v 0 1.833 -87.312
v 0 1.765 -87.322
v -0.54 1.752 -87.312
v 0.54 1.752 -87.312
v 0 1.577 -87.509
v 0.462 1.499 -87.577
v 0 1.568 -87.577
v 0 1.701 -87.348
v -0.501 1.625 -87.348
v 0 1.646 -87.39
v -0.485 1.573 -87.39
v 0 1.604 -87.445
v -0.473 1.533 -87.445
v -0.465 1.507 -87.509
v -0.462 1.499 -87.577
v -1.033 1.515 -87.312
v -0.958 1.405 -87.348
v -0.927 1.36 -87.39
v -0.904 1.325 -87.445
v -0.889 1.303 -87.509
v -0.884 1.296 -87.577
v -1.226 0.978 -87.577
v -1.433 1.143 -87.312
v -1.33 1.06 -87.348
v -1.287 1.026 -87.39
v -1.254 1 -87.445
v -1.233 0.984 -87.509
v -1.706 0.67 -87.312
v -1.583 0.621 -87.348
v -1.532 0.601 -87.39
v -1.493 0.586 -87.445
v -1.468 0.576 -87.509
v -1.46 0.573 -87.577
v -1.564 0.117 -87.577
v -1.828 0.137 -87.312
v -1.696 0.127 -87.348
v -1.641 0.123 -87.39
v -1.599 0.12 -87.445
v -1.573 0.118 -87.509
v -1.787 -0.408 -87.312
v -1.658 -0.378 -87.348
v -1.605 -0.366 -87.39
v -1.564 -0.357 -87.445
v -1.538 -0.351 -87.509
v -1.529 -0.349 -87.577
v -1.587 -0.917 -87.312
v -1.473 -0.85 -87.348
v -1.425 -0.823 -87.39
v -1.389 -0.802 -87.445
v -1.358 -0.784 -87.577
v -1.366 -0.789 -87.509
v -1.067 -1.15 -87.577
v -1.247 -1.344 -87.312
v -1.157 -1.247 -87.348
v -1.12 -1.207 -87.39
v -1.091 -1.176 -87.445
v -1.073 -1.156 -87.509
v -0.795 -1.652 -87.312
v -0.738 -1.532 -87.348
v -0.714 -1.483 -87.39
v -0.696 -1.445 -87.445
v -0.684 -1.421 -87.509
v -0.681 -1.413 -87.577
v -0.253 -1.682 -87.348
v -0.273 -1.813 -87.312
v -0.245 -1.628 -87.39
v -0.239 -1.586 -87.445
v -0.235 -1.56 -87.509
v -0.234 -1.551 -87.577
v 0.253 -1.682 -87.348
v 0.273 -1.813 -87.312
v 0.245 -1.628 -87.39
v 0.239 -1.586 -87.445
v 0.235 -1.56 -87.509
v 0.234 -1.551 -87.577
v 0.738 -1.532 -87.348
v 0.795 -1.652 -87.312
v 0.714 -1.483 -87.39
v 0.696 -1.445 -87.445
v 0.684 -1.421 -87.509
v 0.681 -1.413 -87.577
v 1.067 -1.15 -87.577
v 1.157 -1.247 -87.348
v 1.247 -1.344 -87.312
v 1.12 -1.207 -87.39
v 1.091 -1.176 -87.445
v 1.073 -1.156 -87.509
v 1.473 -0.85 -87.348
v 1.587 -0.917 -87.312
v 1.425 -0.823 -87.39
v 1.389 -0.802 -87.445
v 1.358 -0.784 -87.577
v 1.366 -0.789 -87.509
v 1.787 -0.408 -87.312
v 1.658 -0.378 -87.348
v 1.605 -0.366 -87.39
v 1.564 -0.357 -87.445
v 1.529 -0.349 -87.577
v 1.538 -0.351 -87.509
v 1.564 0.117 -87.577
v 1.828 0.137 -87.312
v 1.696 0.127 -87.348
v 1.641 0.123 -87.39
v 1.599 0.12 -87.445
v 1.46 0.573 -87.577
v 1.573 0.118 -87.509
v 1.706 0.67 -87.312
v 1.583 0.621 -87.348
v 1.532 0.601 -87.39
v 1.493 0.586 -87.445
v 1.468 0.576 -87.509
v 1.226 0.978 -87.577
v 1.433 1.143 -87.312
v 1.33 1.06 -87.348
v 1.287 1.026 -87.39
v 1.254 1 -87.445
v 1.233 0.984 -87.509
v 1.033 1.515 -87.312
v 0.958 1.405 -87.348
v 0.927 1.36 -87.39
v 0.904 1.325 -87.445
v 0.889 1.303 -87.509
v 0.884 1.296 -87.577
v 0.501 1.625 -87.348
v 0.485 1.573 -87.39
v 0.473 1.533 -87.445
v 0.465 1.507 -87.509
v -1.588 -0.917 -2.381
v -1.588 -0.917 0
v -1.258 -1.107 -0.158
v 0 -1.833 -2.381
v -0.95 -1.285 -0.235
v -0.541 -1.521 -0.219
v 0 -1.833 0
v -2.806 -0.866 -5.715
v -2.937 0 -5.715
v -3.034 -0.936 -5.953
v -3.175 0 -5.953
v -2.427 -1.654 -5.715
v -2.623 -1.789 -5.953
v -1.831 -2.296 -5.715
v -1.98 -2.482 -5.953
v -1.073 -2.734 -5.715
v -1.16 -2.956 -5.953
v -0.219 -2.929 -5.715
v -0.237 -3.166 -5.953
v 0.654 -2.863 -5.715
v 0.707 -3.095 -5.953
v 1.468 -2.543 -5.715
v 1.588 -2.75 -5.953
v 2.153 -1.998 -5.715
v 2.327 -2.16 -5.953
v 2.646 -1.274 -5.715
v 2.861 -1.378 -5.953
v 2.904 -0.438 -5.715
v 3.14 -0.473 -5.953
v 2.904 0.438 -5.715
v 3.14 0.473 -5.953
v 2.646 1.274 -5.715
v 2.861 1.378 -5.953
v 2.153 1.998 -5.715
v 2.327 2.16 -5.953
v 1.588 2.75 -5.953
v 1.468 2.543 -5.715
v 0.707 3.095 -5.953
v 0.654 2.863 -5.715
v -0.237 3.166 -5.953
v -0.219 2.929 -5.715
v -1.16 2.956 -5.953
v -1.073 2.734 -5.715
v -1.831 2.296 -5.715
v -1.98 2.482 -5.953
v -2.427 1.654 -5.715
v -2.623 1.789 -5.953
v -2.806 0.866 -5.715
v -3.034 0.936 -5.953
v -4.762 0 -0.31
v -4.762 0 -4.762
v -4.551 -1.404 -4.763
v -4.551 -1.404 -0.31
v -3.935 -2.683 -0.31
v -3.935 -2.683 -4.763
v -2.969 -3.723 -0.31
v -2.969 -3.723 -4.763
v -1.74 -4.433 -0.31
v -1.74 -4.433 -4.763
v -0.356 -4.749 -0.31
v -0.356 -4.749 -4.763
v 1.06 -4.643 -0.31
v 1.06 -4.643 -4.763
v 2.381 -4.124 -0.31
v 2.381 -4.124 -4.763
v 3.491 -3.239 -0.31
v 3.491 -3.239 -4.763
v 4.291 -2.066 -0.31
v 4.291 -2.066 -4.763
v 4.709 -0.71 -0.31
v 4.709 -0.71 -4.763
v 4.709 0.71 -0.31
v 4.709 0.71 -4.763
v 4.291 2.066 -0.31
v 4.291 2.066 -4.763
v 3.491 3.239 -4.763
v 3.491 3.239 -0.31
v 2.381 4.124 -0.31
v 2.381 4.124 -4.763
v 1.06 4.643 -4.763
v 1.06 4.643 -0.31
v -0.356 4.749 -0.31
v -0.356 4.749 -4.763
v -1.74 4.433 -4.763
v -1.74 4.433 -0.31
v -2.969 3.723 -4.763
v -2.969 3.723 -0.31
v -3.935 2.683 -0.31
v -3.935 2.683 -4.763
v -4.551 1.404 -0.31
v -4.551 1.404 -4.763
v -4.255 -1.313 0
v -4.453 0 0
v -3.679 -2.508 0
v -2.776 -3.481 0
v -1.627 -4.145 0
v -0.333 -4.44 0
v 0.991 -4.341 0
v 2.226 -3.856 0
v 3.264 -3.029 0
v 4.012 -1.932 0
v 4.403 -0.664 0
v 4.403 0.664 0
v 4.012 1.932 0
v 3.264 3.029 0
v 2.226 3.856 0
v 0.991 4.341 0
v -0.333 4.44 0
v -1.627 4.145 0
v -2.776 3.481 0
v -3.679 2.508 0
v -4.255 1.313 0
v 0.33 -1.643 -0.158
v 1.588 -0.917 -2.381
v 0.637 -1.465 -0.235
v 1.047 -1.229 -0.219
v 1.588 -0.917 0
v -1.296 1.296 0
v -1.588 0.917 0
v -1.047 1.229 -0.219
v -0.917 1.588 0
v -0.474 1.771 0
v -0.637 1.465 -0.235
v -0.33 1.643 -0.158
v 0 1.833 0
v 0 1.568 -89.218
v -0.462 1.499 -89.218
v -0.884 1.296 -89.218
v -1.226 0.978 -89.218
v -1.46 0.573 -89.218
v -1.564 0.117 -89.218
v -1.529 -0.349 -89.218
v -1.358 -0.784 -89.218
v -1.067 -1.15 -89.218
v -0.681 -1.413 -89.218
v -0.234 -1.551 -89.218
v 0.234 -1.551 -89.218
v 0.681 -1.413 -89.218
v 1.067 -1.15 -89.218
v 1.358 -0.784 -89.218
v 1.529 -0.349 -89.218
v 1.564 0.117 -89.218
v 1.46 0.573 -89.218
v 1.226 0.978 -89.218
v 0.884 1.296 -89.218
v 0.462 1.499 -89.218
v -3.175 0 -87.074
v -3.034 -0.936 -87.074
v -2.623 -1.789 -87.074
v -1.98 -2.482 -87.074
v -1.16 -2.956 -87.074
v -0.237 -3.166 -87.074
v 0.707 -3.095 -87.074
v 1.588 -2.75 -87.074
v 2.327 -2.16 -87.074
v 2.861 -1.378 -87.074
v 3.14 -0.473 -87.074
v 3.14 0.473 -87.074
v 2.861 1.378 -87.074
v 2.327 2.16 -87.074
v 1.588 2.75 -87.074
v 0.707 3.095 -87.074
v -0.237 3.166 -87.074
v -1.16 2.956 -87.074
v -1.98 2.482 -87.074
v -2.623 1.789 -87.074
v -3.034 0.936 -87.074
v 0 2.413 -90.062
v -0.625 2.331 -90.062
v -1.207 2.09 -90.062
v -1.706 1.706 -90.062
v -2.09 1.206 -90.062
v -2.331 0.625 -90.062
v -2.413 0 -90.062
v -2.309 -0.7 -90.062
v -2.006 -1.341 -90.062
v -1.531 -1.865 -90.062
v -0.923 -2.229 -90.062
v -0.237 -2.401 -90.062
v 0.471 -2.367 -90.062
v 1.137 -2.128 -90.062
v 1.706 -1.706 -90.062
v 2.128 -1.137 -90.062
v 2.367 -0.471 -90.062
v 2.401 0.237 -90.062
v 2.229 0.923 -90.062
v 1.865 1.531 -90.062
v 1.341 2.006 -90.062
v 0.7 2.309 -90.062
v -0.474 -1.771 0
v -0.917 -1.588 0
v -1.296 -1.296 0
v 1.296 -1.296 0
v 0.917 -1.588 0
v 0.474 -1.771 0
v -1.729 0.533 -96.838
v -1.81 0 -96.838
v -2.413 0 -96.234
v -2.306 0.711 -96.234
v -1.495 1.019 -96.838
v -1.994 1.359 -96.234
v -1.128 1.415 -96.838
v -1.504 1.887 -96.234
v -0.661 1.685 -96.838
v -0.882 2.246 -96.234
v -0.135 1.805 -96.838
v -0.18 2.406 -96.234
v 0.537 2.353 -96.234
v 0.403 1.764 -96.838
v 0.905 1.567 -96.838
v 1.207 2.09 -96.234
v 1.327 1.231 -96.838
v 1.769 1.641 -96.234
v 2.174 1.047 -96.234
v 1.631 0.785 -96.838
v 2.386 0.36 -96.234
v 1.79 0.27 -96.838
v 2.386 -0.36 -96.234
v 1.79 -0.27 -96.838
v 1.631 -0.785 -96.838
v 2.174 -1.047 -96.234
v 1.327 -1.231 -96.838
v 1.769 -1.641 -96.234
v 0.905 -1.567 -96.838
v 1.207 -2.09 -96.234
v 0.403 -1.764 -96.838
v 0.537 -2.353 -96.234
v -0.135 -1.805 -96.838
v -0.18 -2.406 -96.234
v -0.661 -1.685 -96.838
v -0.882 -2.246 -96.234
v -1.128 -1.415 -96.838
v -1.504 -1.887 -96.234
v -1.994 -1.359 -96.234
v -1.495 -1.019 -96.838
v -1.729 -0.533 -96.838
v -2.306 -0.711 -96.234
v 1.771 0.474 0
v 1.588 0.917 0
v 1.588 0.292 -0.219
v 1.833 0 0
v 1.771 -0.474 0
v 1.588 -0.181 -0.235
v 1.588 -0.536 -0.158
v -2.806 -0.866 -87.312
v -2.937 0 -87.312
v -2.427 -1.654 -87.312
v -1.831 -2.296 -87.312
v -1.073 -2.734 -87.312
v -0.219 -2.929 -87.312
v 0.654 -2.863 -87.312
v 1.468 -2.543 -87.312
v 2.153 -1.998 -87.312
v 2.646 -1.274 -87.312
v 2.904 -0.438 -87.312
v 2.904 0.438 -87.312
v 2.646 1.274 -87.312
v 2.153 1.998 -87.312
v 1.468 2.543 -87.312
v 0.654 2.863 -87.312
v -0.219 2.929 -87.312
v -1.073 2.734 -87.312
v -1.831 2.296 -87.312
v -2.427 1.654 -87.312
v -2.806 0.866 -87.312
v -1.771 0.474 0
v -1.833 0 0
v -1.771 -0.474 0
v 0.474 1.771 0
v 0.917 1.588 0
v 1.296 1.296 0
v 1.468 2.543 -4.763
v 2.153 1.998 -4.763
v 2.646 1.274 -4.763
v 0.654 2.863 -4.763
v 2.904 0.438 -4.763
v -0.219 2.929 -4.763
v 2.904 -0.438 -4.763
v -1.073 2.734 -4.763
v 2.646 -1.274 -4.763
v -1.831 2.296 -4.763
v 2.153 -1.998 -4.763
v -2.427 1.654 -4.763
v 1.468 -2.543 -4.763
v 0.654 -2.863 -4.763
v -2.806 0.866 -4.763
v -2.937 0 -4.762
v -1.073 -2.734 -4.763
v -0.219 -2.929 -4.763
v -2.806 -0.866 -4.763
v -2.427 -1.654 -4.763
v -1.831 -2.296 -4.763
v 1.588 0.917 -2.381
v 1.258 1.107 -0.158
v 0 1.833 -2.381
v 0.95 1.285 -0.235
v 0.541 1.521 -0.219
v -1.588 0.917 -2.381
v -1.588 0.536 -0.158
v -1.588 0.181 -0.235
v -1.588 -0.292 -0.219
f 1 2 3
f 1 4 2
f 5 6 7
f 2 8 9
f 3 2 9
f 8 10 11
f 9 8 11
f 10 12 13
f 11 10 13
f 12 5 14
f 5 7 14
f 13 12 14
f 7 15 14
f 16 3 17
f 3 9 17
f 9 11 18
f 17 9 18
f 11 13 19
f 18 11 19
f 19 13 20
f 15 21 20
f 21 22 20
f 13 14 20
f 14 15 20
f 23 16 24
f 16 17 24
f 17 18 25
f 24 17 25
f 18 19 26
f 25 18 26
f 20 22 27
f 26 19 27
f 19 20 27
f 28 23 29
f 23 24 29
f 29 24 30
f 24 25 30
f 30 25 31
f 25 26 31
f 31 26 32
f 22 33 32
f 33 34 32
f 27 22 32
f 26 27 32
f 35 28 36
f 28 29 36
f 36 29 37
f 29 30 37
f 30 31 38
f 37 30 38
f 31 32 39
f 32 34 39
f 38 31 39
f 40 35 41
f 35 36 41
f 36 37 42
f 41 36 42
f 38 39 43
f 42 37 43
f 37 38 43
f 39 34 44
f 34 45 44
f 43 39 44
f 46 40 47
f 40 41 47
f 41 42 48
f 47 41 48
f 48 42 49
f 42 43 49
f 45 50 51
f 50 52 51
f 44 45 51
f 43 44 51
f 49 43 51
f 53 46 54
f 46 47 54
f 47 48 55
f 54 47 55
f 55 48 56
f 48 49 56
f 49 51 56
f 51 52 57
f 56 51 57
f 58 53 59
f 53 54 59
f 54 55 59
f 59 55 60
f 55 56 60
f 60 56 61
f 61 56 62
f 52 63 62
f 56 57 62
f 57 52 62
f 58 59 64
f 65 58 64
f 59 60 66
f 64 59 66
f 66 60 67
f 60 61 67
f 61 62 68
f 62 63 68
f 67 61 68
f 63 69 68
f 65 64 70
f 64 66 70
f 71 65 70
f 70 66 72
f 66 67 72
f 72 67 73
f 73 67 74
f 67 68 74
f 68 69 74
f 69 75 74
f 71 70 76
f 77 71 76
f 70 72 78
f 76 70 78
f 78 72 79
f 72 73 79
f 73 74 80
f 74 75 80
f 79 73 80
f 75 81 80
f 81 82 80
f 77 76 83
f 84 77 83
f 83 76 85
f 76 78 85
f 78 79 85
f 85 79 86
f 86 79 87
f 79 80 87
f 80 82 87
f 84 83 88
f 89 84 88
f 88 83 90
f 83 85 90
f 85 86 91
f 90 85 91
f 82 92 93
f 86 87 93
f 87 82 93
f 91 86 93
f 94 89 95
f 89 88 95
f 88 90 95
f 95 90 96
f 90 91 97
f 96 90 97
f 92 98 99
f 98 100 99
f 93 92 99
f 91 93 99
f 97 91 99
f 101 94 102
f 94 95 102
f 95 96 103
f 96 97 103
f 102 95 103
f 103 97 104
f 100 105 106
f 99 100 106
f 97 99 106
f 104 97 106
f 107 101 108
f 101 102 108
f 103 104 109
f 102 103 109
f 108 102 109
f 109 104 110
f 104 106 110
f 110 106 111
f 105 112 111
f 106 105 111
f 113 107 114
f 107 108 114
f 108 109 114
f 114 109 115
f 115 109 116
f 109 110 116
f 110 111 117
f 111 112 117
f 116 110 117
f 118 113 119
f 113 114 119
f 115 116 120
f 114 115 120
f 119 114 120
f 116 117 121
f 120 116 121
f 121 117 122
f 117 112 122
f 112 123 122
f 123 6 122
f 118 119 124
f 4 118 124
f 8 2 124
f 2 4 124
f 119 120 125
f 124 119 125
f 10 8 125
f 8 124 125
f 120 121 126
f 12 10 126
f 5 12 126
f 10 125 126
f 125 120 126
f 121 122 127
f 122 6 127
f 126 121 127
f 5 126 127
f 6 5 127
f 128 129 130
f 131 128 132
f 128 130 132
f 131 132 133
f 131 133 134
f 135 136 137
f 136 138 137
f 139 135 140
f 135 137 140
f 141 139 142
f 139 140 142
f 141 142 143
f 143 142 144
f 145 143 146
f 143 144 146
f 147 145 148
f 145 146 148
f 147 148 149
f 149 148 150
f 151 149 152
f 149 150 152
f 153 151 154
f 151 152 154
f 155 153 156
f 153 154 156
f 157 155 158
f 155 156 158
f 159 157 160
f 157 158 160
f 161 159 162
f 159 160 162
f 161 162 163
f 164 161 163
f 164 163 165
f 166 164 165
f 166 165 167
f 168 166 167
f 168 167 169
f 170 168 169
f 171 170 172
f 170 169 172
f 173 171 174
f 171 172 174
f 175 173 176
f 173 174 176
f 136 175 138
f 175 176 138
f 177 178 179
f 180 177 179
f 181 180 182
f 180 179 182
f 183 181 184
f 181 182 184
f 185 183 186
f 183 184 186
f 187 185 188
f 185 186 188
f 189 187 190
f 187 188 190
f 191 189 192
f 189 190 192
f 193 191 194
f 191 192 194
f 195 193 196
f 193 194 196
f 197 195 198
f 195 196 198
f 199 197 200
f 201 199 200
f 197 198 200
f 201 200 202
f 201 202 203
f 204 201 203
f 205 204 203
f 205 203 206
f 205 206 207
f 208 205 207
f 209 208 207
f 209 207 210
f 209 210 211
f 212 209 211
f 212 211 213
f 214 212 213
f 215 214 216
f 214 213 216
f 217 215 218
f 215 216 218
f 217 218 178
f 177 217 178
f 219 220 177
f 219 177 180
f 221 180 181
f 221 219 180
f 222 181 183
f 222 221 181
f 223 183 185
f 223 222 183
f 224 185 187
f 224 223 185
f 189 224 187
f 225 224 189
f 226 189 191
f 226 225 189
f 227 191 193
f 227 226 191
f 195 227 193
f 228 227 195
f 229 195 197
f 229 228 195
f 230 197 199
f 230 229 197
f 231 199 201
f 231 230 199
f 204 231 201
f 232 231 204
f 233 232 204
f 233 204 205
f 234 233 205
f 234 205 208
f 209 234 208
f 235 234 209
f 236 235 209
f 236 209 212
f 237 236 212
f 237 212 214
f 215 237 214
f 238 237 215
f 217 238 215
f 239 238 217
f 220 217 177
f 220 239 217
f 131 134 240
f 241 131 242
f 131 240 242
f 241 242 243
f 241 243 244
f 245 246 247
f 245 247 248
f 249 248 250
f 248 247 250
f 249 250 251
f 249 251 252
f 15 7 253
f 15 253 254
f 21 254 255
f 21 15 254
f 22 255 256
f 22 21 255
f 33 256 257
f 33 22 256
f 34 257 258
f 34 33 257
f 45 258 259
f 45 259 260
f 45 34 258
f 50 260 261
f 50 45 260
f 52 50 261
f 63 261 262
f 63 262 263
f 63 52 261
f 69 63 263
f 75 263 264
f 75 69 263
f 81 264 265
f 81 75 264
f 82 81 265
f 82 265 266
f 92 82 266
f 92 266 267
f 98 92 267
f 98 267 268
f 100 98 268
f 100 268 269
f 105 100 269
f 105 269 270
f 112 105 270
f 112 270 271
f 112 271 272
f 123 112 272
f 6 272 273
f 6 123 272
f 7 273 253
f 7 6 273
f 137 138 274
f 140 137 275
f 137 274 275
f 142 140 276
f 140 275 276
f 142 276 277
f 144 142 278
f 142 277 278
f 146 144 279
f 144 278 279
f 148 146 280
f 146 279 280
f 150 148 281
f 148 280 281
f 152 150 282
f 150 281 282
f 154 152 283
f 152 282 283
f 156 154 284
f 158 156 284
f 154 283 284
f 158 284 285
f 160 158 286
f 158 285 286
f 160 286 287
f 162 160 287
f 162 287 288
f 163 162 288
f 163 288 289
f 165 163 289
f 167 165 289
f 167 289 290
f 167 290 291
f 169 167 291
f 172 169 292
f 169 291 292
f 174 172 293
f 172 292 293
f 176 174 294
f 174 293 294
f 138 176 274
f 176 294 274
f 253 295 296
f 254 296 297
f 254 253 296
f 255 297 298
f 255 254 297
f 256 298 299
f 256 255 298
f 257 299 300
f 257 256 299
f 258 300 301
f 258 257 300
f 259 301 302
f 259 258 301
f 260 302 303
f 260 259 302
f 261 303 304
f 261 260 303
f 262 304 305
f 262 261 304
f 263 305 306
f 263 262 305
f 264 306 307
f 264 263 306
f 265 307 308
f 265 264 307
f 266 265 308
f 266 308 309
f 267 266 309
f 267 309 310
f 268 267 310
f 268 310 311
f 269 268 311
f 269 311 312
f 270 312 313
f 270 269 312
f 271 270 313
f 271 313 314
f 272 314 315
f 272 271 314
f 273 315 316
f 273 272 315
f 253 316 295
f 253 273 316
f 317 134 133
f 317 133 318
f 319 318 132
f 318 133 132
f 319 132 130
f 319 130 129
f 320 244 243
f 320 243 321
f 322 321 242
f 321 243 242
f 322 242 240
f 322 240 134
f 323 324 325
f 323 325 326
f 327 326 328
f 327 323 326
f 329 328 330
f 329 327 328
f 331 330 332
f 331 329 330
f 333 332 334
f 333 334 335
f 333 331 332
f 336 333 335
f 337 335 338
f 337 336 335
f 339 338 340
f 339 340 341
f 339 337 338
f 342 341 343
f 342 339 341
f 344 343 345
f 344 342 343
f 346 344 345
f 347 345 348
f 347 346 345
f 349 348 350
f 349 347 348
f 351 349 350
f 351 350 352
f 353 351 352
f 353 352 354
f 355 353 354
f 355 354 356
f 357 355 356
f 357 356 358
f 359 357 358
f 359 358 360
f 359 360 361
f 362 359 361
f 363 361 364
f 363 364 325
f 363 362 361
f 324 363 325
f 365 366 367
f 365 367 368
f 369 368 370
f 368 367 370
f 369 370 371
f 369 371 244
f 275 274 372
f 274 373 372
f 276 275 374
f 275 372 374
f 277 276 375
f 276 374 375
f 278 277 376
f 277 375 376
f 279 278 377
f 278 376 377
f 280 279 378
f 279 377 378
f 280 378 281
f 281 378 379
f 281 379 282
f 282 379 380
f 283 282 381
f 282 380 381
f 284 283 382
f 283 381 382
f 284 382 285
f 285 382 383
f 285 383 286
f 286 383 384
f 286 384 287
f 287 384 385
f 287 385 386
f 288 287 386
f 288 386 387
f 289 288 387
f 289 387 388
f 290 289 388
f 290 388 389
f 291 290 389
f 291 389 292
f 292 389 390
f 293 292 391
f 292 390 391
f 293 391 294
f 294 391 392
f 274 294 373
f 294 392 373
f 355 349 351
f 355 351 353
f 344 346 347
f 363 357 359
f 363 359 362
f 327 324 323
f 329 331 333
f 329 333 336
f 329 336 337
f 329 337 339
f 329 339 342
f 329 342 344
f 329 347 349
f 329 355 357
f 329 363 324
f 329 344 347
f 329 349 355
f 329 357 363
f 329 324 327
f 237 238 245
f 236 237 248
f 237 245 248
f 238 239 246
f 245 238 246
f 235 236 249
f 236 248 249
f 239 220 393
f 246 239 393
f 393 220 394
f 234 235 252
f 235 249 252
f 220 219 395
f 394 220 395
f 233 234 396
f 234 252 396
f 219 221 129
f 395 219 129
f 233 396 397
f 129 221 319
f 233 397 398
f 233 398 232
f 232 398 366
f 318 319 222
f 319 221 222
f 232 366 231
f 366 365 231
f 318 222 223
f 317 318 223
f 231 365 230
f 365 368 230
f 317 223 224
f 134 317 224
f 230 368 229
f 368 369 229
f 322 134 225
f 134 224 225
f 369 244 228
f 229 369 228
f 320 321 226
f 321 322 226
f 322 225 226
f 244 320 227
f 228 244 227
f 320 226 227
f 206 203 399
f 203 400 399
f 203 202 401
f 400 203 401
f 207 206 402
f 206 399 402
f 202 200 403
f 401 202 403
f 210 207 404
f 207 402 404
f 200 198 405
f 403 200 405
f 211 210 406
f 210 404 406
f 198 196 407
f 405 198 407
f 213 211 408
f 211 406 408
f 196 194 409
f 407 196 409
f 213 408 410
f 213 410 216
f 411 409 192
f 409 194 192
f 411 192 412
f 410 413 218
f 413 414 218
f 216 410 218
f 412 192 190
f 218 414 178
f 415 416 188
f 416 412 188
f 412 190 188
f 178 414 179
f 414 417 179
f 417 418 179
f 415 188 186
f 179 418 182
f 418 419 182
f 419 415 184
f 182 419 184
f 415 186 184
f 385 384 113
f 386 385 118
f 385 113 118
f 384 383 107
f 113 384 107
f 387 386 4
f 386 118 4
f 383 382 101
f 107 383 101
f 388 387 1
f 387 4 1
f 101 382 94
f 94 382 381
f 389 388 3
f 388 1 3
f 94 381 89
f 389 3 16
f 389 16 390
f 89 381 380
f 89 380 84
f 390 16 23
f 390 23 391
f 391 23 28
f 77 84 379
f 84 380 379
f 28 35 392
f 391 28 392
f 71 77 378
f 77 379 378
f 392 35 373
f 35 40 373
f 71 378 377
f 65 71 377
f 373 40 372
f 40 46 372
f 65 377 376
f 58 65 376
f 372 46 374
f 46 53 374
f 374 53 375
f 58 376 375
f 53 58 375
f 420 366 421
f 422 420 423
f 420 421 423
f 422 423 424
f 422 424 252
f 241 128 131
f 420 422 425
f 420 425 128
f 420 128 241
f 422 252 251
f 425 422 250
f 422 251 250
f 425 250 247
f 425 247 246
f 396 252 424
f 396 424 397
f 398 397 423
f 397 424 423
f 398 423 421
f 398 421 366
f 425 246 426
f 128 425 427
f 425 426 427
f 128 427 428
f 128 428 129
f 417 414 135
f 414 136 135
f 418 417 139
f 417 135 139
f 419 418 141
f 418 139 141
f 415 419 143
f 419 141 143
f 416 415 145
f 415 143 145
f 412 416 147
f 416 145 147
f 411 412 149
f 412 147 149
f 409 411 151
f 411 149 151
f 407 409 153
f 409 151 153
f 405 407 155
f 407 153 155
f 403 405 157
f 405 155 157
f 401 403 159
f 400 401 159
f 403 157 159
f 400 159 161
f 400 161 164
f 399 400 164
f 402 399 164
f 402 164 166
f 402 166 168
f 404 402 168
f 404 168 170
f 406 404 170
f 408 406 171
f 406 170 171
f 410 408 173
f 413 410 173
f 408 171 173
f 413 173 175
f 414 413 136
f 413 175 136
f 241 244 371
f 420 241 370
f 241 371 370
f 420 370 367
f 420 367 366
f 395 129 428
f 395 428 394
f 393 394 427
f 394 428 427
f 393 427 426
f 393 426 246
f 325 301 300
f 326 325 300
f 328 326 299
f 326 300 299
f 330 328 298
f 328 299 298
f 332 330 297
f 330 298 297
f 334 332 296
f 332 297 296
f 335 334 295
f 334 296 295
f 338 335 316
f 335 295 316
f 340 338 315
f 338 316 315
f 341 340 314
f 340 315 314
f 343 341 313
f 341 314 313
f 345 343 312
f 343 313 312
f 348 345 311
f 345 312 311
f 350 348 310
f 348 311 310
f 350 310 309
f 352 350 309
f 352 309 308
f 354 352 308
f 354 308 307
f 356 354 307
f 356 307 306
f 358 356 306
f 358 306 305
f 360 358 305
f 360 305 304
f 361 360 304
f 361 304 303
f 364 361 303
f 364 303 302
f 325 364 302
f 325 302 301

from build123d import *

# Parameters (mm, degrees)
SKETCH12_R          = 2.413
BOSS_EXTRUDE1_DEPTH = 9.525
CHAMFER1_SIZE       = 0.60325
CHAMFER2_SIZE       = 0.3095625
FILLET1_R           = 0.264583333
CUT_EXTRUDE2_DEPTH  = 2.38125


with BuildPart() as part:
    # Sketch13 → Revolve1 (revolve)
    with BuildSketch(Plane(origin=(0, 0, 0), x_dir=(0, 0, -1), z_dir=(1, 0, 0)), mode=Mode.PRIVATE) as revolve1_sk:
        Polygon((0, 0), (0, 4.7625), (4.7625, 4.7625), (4.7625, 2.936875), (5.715, 2.936875), (5.953125, 3.175), (87.074375, 3.175), (87.3125, 2.936875), (87.3125, 0), align=None)
    revolve(revolve1_sk.sketch.rotate(Axis((0, 0, -87.3125), (0, 0, 1)), 90), axis=Axis((0, 0, -87.3125), (0, 0, 1)))

    # Sketch12 → Boss-Extrude1 (add)
    with BuildSketch(Plane(origin=(0, 0, -87.3125), x_dir=(-1, 0, 0), z_dir=(0, 0, -1))):
        Circle(SKETCH12_R)
    extrude(amount=BOSS_EXTRUDE1_DEPTH)

    # Sketch5 → Cut-Revolve1 (revolve, cut)
    with BuildSketch(Plane(origin=(0, 0, 0), x_dir=(0, 0, -1), z_dir=(1, 0, 0))):
        Polygon((87.3125, 2.413), (90.06205, 2.413), (89.2175, 1.56845), (87.3125, 1.56845), align=None)
    revolve(axis=Axis((0, 0, -87.3125), (0, 0, 1)), mode=Mode.SUBTRACT)

    # Chamfer1
    chamfer1_edges = [part.edges().sort_by_distance(p)[0] for p in [
        (2.413, 0, -96.8375),
    ]]
    chamfer(chamfer1_edges, length=CHAMFER1_SIZE)

    # Chamfer2
    chamfer2_edges = [part.edges().sort_by_distance(p)[0] for p in [
        (4.7625, 0, 0),
    ]]
    chamfer(chamfer2_edges, length=CHAMFER2_SIZE)

    # Fillet1
    fillet1_edges = [part.edges().sort_by_distance(p)[0] for p in [
        (0, -1.56845, -87.3125),
    ]]
    fillet(fillet1_edges, radius=FILLET1_R)

    # Sketch8 → Cut-Extrude2 (cut)
    with BuildSketch(Plane.XY):
        Polygon((1.5875, 0.916543552), (0, 1.833087105), (-1.5875, 0.916543552), (-1.5875, -0.916543552), (0, -1.833087105), (1.5875, -0.916543552), align=None)
    extrude(amount=-CUT_EXTRUDE2_DEPTH, mode=Mode.SUBTRACT)

    # Cut-Extrude4 cone 1 section (through the dimple's axis) → Cut-Extrude4 (revolve, cut)
    with BuildSketch(Plane(origin=(0, 0, 0), x_dir=(0, -1, 0), z_dir=(1, 0, 0))):
        Polygon((0, 0), (1.833087105, 0), (0, 1.833087105), align=None)
    revolve(axis=Axis((0, 0, 0), (0, 0, -1)), mode=Mode.SUBTRACT)


solid = part.part
